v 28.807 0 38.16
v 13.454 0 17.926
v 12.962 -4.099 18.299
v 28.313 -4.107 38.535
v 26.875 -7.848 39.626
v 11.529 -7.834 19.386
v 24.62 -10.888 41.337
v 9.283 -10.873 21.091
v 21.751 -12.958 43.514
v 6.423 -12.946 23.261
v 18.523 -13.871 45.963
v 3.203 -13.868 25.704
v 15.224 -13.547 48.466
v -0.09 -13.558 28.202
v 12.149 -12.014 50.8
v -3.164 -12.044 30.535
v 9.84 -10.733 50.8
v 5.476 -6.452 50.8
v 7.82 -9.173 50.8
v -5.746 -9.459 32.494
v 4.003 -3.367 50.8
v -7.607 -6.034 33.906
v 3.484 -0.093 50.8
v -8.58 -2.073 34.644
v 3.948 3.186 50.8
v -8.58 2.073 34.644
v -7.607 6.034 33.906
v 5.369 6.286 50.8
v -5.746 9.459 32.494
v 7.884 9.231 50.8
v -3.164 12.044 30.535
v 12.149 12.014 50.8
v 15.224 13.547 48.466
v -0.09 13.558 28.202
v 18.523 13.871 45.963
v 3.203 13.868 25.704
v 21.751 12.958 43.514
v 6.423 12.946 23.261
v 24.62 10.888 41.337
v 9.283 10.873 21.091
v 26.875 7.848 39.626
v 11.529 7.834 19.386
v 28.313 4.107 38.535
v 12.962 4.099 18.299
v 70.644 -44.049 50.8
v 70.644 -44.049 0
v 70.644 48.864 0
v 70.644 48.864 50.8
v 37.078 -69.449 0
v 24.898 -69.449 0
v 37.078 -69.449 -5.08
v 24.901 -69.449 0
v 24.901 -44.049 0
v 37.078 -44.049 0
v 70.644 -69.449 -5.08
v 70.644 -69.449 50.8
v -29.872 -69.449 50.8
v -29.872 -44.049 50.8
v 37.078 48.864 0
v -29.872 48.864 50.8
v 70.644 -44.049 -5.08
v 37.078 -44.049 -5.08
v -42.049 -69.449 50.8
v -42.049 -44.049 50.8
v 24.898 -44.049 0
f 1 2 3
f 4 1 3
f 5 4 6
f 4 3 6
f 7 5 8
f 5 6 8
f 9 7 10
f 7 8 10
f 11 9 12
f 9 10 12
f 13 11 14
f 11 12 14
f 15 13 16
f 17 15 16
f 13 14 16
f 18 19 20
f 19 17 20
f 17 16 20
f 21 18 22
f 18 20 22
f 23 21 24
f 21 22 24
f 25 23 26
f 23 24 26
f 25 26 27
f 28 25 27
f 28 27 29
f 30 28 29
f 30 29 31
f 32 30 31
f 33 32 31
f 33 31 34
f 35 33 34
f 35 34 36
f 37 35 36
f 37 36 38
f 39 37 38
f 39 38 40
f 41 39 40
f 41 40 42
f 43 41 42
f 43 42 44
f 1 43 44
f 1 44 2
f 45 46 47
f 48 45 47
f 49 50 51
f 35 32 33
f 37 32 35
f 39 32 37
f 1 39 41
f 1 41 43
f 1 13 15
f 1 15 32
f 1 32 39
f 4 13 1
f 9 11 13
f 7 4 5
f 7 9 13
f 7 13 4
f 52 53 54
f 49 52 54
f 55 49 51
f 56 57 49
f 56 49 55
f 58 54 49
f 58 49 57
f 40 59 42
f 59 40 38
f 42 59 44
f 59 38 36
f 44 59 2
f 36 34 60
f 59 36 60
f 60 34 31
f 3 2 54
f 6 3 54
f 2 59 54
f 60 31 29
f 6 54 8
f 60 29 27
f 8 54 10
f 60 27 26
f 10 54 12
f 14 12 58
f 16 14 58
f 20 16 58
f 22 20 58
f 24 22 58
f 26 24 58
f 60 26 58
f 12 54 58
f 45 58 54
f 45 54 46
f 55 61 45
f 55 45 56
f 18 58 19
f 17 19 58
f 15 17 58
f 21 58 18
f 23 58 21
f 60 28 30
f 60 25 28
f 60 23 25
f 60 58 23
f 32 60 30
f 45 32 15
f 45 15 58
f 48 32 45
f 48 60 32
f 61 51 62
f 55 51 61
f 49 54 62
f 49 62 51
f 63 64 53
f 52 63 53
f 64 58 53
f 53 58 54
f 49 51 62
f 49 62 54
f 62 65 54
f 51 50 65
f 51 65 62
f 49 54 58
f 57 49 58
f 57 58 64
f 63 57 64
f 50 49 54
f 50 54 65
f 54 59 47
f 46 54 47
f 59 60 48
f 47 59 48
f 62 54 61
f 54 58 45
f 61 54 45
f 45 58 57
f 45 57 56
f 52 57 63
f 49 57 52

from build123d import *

# Parameters (mm, degrees)
F0_W      = 133.2719624043
F0_H      = 92.9137095809
F1_DEPTH  = 50.8
F3_DEPTH  = 127
F5_DEPTH  = 25.4
F6_DEPTH  = 25.4
F7_R      = 13.9069299175
F8_DEPTH  = 25.4
F9_W      = 33.5661992431
F9_H      = 25.4
F10_DEPTH = 5.08
F12_DEPTH = 25.4


with BuildPart() as f1:
    # F0 (on Top) → F1 (new body)
    with BuildSketch(Plane.XY):
        with Locations((4.0084272623, 2.4075768888)):
            Rectangle(F0_W, F0_H)
    extrude(amount=F1_DEPTH)

    # F2 (on face) → F3 (cut)
    with BuildSketch(Plane.XZ.offset(44.0492779016)):
        Polygon((37.0782092214, 0), (-29.8720244318, 50.8), (-62.6275539398, 50.8), (-62.6275539398, 0), align=None)
    extrude(amount=-F3_DEPTH, mode=Mode.SUBTRACT)


with BuildPart() as f5:
    # F4 (on face) → F5 (new body)
    with BuildSketch(Plane.XZ.offset(44.0492779016)):
        Polygon((37.0782092214, 0), (-29.8720244318, 50.8), (-42.048888281, 50.8), (24.9013453722, 0), align=None)
    extrude(amount=F5_DEPTH)


with BuildPart() as f6:
    # F6 (new): a face of the model
    f6_faces = [f1.part.faces().sort_by_distance(p)[0] for p in [
        (34.3379473054, -44.0492779016, 29.6275819213),
    ]]
    extrude(f6_faces, amount=F6_DEPTH)

    # F9 (on face) → F10 (join)
    with BuildSketch(Plane(origin=(0, 0, 0), x_dir=(1, 0, 0), z_dir=(0, 0, -1))):
        with Locations((53.8613088429, 56.7492779016)):
            Rectangle(F9_W, F9_H)
    extrude(amount=F10_DEPTH)


with BuildPart() as f1_1:
    add(f1.part)

    # F7 (on face) → F8 (cut)
    with BuildSketch(Plane(origin=(13.5474819448, 0, 17.8544701105), x_dir=(0.7966330129, 0, -0.6044632684), z_dir=(-0.6044632684, 0, -0.7966330129))):
        with Locations((-14.0245705843, 0)):
            Circle(F7_R)
    extrude(amount=-F8_DEPTH, mode=Mode.SUBTRACT)


with BuildPart() as f12:
    # F11 (on face) → F12 (new body)
    with BuildSketch(Plane.XZ.offset(69.4492779016)):
        Polygon((37.0782092214, 0), (24.8976163566, 0), (37.0782092214, -5.08), align=None)
    extrude(amount=-F12_DEPTH)


solid = Compound([f5.part, f6.part, f1_1.part, f12.part])
